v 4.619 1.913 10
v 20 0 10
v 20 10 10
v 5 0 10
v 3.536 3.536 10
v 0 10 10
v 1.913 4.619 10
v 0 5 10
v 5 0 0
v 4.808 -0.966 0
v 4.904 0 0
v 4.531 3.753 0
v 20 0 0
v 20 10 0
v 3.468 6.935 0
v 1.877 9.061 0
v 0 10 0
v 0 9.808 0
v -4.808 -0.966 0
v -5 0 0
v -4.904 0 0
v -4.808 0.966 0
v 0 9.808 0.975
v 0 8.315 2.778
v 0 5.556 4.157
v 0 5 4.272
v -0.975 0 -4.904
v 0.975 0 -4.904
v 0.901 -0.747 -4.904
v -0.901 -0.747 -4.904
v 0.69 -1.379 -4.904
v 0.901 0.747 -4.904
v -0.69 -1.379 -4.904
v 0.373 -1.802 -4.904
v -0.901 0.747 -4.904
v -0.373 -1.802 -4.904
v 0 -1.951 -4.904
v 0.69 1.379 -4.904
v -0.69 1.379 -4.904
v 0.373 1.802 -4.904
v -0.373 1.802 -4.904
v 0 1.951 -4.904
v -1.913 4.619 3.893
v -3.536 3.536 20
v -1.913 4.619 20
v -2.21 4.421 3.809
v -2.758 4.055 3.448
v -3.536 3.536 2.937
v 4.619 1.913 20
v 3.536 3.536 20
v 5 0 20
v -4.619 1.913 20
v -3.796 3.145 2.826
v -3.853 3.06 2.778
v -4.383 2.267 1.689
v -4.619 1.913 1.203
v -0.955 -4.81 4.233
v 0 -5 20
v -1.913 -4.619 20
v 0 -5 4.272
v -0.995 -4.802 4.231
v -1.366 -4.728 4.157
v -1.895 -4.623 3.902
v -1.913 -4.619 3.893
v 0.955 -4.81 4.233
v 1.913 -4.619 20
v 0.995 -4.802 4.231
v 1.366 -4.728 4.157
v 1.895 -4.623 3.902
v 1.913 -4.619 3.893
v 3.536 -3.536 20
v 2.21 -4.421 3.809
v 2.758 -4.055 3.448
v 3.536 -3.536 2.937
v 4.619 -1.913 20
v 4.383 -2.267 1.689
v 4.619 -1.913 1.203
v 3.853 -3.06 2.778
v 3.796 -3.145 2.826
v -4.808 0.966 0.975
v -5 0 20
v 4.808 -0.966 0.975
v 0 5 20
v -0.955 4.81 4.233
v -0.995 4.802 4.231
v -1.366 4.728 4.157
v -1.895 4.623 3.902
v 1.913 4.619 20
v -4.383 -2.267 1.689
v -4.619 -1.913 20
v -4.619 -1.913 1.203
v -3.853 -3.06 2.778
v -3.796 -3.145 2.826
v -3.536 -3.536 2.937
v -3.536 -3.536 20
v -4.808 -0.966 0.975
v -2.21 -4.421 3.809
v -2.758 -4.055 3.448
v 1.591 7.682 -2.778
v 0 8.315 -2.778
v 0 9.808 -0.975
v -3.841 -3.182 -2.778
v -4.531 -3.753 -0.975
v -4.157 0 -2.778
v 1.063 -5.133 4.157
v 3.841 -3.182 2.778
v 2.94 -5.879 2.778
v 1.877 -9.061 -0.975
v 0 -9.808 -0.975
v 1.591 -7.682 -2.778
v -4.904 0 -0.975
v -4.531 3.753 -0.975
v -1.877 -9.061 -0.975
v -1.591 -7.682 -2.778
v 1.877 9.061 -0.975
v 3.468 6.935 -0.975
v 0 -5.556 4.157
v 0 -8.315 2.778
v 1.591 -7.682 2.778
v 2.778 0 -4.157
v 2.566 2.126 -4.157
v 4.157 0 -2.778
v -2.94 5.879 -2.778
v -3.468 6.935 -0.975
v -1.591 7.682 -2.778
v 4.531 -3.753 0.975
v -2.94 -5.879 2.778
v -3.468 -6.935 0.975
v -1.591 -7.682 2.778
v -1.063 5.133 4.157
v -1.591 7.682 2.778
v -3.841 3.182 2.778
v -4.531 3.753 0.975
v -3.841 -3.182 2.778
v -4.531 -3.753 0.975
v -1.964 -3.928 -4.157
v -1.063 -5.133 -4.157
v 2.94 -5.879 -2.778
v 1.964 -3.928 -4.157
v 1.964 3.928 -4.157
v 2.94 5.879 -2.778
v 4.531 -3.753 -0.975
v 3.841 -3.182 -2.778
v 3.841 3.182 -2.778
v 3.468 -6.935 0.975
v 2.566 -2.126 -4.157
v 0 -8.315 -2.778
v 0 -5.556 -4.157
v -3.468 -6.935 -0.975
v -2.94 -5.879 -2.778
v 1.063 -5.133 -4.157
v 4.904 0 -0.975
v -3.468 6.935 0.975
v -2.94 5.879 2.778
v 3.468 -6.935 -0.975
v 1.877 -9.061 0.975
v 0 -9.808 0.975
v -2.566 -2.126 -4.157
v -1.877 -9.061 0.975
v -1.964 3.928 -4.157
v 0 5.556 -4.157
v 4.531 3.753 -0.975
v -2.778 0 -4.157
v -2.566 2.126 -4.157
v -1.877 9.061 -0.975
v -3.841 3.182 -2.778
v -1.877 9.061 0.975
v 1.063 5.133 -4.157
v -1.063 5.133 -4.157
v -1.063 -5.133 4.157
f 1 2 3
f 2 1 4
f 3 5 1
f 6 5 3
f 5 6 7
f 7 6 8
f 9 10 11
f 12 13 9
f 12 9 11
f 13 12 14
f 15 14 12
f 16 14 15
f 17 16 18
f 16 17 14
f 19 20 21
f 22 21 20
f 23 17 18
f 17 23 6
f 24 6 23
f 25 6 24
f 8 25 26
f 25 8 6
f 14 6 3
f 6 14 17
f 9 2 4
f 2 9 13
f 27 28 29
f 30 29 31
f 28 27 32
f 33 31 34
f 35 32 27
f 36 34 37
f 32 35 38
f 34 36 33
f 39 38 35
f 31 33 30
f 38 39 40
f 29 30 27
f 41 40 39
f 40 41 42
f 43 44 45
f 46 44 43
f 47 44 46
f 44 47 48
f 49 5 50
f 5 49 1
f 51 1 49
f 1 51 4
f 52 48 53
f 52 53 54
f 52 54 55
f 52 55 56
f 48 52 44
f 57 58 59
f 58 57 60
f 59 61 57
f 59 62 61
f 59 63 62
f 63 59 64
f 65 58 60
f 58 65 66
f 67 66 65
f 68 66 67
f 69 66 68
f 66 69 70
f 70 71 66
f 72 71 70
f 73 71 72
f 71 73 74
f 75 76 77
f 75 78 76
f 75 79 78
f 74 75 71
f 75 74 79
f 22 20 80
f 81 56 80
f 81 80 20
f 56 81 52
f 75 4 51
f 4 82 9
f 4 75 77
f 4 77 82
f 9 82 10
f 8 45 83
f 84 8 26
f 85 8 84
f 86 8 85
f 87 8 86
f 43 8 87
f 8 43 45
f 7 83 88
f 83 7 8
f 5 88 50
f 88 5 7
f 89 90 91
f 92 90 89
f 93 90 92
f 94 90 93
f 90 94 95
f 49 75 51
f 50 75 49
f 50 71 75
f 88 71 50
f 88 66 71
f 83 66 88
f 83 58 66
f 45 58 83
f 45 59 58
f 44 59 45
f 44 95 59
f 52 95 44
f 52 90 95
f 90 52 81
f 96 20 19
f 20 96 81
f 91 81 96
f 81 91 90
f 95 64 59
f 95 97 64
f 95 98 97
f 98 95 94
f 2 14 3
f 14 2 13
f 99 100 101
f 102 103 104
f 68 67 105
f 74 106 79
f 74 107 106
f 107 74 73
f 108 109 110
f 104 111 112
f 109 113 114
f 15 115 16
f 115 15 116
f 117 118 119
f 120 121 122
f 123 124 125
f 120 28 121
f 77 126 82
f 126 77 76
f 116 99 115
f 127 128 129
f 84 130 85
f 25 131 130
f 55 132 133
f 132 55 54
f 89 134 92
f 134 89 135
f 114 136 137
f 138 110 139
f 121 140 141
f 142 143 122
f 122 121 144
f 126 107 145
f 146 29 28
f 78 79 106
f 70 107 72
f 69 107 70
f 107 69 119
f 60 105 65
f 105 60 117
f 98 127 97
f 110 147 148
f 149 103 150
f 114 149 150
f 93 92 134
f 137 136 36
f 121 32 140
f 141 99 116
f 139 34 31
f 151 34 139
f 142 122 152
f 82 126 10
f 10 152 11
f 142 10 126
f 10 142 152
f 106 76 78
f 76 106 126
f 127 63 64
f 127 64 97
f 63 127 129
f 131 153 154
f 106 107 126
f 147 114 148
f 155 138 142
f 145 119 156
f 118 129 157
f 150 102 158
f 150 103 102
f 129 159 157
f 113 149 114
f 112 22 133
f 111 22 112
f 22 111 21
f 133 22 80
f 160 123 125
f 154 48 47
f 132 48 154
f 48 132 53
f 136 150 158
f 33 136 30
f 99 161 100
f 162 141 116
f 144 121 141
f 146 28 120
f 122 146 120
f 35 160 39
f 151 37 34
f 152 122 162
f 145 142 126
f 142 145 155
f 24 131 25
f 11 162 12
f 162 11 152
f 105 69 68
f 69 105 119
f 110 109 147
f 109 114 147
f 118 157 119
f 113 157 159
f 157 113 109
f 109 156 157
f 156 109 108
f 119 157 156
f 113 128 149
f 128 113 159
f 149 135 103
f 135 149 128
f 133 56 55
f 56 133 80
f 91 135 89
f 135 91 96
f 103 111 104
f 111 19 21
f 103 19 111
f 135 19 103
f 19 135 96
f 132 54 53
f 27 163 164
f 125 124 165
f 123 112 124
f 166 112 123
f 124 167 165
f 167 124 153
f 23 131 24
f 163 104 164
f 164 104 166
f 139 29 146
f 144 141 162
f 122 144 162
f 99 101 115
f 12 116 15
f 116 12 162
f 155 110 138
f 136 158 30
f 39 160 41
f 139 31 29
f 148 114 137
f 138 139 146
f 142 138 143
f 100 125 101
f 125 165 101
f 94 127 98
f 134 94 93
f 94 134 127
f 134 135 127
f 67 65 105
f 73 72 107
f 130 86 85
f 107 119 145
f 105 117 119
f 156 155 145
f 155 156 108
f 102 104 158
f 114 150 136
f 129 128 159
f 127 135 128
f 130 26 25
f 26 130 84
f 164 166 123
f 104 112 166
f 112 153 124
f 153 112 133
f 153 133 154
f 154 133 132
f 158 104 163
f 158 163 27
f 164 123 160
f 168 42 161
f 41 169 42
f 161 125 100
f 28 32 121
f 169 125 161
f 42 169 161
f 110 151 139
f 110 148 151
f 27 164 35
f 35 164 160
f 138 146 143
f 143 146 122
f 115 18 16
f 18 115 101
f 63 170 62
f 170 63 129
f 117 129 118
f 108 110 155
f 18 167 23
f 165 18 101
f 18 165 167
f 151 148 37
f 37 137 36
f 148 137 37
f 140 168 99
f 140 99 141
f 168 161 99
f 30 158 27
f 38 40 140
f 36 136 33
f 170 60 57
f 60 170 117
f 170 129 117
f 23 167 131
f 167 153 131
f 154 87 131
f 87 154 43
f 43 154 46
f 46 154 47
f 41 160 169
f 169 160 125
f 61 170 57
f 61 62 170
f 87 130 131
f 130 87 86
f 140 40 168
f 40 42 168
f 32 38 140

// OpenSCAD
// primitives
cube(10);
sphere(5);
cylinder(h=20, r=5);

// transformations
translate([10, 0, 0]) cube(10);
rotate([0, 0, 45]) cylinder(h=20, r=3);
scale([1, 2, 1]) sphere(5);
